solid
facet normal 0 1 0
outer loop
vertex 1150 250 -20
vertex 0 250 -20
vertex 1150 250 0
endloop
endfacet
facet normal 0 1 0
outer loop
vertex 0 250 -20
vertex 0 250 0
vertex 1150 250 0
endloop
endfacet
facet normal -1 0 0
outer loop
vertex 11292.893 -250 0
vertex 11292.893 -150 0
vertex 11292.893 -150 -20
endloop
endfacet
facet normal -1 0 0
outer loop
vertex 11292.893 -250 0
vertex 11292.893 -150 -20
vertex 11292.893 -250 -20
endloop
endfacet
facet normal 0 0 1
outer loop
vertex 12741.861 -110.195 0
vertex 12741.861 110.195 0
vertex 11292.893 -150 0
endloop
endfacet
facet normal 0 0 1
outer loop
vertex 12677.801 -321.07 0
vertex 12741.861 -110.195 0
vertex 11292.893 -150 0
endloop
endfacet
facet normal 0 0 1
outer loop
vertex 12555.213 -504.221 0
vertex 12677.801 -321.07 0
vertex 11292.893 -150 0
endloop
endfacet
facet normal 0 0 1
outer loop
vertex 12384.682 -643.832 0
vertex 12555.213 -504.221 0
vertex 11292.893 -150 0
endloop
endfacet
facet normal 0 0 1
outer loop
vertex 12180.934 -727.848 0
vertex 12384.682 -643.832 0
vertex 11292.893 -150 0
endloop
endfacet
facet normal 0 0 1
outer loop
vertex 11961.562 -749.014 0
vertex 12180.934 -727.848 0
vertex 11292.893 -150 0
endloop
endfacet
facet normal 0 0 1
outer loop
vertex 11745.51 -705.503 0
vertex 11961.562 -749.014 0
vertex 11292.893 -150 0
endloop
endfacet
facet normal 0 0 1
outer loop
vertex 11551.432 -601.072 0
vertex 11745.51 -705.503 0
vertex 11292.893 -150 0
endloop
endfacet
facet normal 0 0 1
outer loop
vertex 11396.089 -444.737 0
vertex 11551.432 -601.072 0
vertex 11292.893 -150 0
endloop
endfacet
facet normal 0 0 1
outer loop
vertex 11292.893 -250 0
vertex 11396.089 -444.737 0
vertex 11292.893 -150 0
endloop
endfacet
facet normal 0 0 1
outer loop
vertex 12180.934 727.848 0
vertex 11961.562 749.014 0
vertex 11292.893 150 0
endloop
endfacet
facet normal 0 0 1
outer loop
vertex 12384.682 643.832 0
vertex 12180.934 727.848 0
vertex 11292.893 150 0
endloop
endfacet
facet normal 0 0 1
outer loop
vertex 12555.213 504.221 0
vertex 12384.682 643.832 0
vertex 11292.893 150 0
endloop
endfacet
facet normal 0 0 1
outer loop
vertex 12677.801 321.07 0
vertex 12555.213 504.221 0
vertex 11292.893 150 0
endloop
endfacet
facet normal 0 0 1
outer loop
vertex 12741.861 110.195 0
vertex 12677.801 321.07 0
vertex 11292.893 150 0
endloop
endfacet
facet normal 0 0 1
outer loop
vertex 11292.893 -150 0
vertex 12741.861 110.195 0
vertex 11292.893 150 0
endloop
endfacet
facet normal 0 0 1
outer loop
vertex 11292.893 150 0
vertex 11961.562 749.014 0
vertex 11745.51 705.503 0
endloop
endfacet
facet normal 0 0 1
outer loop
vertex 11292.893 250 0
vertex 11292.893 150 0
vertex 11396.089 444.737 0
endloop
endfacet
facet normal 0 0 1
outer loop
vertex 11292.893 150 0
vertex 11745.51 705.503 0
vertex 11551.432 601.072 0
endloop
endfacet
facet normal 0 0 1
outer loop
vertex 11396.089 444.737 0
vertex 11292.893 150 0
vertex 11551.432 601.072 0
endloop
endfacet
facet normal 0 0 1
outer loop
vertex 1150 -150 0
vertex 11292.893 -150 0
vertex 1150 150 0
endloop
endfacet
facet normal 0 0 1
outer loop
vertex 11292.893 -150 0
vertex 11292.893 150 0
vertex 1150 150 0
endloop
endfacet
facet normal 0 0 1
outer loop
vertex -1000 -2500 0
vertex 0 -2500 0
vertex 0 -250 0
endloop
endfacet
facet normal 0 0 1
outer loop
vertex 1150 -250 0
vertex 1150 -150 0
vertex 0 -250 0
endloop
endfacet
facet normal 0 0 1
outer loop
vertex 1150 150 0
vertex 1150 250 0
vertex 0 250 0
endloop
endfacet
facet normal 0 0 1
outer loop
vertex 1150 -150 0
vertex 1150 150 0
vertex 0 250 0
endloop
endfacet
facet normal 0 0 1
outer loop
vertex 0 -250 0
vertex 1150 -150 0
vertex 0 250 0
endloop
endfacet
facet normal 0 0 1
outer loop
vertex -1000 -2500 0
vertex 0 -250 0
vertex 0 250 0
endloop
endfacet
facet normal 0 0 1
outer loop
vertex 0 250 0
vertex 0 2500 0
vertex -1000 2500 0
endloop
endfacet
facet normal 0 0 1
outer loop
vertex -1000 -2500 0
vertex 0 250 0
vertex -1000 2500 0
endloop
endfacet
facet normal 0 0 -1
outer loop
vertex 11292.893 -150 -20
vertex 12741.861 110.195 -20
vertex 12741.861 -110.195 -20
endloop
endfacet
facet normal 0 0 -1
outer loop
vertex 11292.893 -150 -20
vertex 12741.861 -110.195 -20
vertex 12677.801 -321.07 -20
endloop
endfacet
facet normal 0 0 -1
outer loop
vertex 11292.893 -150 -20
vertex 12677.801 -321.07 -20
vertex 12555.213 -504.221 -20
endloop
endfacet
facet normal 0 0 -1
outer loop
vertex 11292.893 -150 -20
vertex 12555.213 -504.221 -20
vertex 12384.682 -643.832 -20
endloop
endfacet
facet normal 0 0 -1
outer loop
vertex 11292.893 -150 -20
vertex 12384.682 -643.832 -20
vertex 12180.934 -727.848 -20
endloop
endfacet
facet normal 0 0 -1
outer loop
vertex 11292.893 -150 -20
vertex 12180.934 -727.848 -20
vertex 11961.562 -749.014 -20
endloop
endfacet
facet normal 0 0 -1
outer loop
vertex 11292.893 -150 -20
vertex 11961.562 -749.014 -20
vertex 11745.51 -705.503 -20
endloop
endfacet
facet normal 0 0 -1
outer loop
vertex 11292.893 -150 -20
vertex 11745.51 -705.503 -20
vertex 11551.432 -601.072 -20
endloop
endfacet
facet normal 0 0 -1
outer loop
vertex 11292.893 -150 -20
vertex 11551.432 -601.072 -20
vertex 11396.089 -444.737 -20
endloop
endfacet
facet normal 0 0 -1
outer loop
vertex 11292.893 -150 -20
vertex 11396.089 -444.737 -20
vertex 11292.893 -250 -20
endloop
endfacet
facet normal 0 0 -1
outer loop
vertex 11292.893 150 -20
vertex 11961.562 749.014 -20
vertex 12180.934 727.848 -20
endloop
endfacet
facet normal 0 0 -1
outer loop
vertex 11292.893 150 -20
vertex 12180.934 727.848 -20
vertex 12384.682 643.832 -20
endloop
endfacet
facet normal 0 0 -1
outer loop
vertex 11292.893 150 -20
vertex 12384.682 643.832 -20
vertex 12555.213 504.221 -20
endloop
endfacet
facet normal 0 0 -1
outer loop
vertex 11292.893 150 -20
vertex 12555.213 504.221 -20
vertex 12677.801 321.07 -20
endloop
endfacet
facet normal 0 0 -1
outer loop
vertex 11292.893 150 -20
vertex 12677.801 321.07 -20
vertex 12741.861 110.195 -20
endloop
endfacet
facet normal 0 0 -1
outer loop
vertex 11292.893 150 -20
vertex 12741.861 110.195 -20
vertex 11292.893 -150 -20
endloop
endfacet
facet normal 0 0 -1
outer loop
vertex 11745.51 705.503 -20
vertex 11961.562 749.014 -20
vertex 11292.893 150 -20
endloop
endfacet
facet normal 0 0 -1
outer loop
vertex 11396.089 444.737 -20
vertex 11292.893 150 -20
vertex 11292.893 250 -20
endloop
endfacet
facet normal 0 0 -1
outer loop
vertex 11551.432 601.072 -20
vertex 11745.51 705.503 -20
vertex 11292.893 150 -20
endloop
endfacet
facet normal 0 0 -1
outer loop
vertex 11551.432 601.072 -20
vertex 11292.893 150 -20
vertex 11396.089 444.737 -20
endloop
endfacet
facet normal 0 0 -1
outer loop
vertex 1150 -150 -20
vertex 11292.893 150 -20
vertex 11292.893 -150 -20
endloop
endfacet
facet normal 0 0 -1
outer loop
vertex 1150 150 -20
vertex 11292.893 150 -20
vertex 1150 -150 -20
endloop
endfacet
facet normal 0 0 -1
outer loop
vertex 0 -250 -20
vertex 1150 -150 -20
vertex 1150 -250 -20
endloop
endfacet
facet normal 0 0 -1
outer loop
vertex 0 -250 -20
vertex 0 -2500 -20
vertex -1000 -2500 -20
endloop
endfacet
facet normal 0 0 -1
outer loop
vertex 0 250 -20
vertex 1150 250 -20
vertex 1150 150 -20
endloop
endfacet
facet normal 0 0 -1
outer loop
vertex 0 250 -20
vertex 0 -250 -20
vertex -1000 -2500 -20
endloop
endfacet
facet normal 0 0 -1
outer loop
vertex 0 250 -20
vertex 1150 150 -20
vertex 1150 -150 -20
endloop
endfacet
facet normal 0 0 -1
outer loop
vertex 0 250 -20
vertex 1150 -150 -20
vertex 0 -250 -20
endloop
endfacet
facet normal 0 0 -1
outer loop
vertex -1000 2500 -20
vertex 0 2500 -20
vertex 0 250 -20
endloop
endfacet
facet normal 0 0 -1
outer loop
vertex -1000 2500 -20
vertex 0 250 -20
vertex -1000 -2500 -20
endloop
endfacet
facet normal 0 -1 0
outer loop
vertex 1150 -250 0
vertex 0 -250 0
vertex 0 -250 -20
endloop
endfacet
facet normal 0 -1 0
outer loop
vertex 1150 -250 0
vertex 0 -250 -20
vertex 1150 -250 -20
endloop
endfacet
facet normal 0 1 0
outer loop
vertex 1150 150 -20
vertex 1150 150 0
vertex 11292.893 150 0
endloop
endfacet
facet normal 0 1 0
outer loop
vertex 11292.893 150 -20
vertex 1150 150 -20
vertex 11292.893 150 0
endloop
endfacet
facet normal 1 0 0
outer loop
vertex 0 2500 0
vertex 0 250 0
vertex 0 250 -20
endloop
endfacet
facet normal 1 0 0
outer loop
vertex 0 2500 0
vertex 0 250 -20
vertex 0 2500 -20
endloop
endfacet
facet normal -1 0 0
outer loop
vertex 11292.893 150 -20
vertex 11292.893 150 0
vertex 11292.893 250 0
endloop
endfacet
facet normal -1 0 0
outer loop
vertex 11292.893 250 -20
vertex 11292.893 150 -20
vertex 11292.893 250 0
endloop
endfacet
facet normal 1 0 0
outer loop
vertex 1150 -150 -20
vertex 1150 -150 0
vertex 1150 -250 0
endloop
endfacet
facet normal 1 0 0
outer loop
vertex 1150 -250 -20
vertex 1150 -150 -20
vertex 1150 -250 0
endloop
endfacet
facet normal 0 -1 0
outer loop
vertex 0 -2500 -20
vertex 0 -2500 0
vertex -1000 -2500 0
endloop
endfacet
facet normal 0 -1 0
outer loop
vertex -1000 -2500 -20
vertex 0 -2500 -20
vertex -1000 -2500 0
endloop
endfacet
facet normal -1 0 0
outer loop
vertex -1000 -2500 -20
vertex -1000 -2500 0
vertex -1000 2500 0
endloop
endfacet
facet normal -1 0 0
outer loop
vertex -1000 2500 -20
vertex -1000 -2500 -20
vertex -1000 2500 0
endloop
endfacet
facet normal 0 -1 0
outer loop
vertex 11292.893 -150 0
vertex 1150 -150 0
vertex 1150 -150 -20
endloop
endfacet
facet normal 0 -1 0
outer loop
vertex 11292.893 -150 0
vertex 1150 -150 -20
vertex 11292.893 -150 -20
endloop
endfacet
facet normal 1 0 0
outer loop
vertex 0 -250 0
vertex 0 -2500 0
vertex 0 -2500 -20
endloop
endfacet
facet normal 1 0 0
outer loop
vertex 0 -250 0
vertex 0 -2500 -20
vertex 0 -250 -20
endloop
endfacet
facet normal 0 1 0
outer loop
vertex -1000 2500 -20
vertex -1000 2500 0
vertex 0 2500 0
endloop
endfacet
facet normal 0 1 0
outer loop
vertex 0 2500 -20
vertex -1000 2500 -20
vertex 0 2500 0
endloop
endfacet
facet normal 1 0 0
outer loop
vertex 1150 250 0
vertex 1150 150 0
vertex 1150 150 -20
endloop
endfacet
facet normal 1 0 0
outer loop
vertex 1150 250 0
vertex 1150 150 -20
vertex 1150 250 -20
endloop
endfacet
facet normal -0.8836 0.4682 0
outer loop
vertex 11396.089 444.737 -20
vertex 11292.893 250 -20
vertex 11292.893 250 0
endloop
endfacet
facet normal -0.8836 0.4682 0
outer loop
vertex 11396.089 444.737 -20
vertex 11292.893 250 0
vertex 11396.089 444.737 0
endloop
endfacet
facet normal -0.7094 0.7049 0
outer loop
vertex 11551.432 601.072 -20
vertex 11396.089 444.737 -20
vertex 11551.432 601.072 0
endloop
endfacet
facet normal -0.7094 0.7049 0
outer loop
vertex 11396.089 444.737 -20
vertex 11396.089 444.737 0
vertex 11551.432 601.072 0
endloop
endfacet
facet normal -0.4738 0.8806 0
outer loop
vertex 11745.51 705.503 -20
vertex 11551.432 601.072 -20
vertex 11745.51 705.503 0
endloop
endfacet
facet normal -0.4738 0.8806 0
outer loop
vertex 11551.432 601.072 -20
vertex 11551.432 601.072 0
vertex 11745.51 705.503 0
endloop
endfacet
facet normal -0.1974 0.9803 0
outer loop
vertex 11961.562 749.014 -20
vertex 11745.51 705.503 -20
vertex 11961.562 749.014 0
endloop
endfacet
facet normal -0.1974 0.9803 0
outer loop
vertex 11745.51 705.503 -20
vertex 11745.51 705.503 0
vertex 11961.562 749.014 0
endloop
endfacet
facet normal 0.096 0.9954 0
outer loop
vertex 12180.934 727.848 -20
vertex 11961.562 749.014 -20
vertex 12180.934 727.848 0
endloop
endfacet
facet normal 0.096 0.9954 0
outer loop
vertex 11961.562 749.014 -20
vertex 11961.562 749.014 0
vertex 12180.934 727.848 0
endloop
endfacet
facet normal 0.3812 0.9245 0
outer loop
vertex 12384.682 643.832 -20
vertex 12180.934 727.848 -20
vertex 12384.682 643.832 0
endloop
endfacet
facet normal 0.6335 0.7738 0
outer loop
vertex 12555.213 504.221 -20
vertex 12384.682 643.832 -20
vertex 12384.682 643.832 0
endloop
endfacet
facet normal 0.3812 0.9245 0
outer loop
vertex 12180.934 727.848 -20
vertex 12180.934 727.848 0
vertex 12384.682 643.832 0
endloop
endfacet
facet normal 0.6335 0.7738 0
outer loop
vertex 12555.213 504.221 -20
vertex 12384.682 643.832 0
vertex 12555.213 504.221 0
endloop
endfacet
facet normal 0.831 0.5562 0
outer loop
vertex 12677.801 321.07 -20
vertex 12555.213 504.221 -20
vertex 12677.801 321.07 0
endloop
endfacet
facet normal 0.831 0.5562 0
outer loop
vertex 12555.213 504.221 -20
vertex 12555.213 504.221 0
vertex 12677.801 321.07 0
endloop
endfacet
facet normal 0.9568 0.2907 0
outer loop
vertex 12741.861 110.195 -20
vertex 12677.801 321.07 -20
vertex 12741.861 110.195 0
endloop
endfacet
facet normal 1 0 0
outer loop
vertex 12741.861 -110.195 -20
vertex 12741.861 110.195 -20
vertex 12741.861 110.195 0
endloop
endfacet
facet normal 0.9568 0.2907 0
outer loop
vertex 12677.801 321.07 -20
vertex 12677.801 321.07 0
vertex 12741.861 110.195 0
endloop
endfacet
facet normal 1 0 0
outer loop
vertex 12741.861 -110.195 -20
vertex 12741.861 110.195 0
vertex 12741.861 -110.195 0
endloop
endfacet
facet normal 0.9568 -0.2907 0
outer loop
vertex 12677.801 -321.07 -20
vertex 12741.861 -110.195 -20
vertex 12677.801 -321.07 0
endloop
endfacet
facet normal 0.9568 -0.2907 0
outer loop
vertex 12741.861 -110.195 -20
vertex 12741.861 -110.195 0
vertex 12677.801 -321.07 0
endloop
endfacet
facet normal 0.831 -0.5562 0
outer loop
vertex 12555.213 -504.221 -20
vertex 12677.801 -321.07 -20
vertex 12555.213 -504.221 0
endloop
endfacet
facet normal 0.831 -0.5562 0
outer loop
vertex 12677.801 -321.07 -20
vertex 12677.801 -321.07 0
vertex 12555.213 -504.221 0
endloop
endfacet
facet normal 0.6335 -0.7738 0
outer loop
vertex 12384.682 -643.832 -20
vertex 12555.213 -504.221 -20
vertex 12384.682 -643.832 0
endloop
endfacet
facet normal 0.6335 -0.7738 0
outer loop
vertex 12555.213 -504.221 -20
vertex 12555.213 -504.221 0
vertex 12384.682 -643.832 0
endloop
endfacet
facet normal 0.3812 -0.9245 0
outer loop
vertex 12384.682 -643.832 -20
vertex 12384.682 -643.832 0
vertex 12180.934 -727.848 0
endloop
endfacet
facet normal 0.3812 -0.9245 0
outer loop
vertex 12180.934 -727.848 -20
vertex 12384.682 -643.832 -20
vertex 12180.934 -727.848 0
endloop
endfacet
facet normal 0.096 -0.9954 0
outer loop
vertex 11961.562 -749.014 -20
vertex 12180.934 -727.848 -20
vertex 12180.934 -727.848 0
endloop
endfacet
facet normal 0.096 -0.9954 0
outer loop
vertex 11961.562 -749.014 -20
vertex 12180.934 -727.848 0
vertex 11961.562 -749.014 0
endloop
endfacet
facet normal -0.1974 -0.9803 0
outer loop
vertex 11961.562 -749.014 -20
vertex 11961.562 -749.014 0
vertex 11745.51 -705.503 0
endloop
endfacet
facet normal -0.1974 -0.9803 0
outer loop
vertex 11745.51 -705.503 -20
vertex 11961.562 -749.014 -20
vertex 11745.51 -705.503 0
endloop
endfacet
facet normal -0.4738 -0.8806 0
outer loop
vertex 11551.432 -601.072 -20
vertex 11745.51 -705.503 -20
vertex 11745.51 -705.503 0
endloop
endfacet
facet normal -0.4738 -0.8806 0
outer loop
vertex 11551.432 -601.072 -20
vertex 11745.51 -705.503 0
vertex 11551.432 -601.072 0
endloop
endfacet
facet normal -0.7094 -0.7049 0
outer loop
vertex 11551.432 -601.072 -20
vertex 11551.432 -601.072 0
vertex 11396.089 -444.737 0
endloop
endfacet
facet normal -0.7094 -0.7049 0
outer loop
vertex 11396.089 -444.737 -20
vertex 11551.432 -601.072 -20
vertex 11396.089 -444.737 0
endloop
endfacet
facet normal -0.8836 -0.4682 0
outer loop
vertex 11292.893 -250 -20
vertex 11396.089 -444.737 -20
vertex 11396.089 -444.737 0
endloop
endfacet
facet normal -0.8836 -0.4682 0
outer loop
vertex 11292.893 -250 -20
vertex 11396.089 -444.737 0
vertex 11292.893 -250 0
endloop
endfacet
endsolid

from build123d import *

# Parameters (mm, degrees)
BOSS_EXTRUDE1_DEPTH = 20
SKETCH2_W           = 1000
SKETCH2_H           = 2250
CUT_EXTRUDE1_DEPTH  = 12993.801853334
CUT_EXTRUDE4_DEPTH  = 12993.801853334
SKETCH5_W           = 11500
SKETCH5_H           = 500
BOSS_EXTRUDE2_DEPTH = 20
SKETCH7_W           = 10142.893218813
SKETCH7_H           = 100
CUT_EXTRUDE5_DEPTH  = 12993.801853334


with BuildPart() as part:
    # Sketch1 → Boss-Extrude1 (new body)
    with BuildSketch(Plane.XY):
        with BuildLine():
            Line((1000, 250), (5000, 250))
            Line((5000, 250), (5000, 125))
            Line((5000, 125), (9000, 125))
            Line((9000, 125), (9000, 100))
            Line((9000, 100), (11256.696562634, 100))
            ThreePointArc((11256.696562634, 100), (12750, 0), (11256.696562634, -100))
            Line((11256.696562634, -100), (9000, -100))
            Line((9000, -100), (9000, -125))
            Line((9000, -125), (5000, -125))
            Line((5000, -125), (5000, -250))
            Line((5000, -250), (1000, -250))
            Line((1000, -250), (1000, -2500))
            Line((1000, -2500), (-1000, -2500))
            Line((-1000, -2500), (-1000, 2500))
            Line((-1000, 2500), (1000, 2500))
            Line((1000, 2500), (1000, 250))
        make_face()
    extrude(amount=-BOSS_EXTRUDE1_DEPTH)

    # Sketch2 → Cut-Extrude1 (cut, through all)
    with BuildSketch(Plane.XY):
        with Locations((500, 1375)):
            Rectangle(SKETCH2_W, SKETCH2_H)
        with Locations((500, -1375)):
            Rectangle(SKETCH2_W, SKETCH2_H)
    extrude(amount=-CUT_EXTRUDE1_DEPTH, mode=Mode.SUBTRACT)

    # Sketch3 → Cut-Extrude4 (cut, through all)
    with BuildSketch(Plane.XY):
        Polygon((1500, -250), (3250, -250), (5000, -250), (5000, -150), (3250, -150), (3250, -200), (1500, -200), align=None)
    cut_extrude4 = extrude(amount=-CUT_EXTRUDE4_DEPTH, mode=Mode.SUBTRACT)

    # Mirror1: Cut-Extrude4 across plane
    add(cut_extrude4.mirror(Plane.ZX), mode=Mode.SUBTRACT)

    # Sketch5 → Boss-Extrude2 (add)
    with BuildSketch(Plane.XY):
        with Locations((5750, 0)):
            Rectangle(SKETCH5_W, SKETCH5_H)
    extrude(amount=-BOSS_EXTRUDE2_DEPTH)

    # Sketch7 → Cut-Extrude5 (cut, through all)
    with BuildSketch(Plane.XY):
        with Locations((6221.446609407, 200)):
            Rectangle(SKETCH7_W, SKETCH7_H)
    cut_extrude5 = extrude(amount=-CUT_EXTRUDE5_DEPTH, mode=Mode.SUBTRACT)

    # Mirror2: Cut-Extrude5 across plane
    add(cut_extrude5.mirror(Plane.ZX), mode=Mode.SUBTRACT)


solid = part.part
